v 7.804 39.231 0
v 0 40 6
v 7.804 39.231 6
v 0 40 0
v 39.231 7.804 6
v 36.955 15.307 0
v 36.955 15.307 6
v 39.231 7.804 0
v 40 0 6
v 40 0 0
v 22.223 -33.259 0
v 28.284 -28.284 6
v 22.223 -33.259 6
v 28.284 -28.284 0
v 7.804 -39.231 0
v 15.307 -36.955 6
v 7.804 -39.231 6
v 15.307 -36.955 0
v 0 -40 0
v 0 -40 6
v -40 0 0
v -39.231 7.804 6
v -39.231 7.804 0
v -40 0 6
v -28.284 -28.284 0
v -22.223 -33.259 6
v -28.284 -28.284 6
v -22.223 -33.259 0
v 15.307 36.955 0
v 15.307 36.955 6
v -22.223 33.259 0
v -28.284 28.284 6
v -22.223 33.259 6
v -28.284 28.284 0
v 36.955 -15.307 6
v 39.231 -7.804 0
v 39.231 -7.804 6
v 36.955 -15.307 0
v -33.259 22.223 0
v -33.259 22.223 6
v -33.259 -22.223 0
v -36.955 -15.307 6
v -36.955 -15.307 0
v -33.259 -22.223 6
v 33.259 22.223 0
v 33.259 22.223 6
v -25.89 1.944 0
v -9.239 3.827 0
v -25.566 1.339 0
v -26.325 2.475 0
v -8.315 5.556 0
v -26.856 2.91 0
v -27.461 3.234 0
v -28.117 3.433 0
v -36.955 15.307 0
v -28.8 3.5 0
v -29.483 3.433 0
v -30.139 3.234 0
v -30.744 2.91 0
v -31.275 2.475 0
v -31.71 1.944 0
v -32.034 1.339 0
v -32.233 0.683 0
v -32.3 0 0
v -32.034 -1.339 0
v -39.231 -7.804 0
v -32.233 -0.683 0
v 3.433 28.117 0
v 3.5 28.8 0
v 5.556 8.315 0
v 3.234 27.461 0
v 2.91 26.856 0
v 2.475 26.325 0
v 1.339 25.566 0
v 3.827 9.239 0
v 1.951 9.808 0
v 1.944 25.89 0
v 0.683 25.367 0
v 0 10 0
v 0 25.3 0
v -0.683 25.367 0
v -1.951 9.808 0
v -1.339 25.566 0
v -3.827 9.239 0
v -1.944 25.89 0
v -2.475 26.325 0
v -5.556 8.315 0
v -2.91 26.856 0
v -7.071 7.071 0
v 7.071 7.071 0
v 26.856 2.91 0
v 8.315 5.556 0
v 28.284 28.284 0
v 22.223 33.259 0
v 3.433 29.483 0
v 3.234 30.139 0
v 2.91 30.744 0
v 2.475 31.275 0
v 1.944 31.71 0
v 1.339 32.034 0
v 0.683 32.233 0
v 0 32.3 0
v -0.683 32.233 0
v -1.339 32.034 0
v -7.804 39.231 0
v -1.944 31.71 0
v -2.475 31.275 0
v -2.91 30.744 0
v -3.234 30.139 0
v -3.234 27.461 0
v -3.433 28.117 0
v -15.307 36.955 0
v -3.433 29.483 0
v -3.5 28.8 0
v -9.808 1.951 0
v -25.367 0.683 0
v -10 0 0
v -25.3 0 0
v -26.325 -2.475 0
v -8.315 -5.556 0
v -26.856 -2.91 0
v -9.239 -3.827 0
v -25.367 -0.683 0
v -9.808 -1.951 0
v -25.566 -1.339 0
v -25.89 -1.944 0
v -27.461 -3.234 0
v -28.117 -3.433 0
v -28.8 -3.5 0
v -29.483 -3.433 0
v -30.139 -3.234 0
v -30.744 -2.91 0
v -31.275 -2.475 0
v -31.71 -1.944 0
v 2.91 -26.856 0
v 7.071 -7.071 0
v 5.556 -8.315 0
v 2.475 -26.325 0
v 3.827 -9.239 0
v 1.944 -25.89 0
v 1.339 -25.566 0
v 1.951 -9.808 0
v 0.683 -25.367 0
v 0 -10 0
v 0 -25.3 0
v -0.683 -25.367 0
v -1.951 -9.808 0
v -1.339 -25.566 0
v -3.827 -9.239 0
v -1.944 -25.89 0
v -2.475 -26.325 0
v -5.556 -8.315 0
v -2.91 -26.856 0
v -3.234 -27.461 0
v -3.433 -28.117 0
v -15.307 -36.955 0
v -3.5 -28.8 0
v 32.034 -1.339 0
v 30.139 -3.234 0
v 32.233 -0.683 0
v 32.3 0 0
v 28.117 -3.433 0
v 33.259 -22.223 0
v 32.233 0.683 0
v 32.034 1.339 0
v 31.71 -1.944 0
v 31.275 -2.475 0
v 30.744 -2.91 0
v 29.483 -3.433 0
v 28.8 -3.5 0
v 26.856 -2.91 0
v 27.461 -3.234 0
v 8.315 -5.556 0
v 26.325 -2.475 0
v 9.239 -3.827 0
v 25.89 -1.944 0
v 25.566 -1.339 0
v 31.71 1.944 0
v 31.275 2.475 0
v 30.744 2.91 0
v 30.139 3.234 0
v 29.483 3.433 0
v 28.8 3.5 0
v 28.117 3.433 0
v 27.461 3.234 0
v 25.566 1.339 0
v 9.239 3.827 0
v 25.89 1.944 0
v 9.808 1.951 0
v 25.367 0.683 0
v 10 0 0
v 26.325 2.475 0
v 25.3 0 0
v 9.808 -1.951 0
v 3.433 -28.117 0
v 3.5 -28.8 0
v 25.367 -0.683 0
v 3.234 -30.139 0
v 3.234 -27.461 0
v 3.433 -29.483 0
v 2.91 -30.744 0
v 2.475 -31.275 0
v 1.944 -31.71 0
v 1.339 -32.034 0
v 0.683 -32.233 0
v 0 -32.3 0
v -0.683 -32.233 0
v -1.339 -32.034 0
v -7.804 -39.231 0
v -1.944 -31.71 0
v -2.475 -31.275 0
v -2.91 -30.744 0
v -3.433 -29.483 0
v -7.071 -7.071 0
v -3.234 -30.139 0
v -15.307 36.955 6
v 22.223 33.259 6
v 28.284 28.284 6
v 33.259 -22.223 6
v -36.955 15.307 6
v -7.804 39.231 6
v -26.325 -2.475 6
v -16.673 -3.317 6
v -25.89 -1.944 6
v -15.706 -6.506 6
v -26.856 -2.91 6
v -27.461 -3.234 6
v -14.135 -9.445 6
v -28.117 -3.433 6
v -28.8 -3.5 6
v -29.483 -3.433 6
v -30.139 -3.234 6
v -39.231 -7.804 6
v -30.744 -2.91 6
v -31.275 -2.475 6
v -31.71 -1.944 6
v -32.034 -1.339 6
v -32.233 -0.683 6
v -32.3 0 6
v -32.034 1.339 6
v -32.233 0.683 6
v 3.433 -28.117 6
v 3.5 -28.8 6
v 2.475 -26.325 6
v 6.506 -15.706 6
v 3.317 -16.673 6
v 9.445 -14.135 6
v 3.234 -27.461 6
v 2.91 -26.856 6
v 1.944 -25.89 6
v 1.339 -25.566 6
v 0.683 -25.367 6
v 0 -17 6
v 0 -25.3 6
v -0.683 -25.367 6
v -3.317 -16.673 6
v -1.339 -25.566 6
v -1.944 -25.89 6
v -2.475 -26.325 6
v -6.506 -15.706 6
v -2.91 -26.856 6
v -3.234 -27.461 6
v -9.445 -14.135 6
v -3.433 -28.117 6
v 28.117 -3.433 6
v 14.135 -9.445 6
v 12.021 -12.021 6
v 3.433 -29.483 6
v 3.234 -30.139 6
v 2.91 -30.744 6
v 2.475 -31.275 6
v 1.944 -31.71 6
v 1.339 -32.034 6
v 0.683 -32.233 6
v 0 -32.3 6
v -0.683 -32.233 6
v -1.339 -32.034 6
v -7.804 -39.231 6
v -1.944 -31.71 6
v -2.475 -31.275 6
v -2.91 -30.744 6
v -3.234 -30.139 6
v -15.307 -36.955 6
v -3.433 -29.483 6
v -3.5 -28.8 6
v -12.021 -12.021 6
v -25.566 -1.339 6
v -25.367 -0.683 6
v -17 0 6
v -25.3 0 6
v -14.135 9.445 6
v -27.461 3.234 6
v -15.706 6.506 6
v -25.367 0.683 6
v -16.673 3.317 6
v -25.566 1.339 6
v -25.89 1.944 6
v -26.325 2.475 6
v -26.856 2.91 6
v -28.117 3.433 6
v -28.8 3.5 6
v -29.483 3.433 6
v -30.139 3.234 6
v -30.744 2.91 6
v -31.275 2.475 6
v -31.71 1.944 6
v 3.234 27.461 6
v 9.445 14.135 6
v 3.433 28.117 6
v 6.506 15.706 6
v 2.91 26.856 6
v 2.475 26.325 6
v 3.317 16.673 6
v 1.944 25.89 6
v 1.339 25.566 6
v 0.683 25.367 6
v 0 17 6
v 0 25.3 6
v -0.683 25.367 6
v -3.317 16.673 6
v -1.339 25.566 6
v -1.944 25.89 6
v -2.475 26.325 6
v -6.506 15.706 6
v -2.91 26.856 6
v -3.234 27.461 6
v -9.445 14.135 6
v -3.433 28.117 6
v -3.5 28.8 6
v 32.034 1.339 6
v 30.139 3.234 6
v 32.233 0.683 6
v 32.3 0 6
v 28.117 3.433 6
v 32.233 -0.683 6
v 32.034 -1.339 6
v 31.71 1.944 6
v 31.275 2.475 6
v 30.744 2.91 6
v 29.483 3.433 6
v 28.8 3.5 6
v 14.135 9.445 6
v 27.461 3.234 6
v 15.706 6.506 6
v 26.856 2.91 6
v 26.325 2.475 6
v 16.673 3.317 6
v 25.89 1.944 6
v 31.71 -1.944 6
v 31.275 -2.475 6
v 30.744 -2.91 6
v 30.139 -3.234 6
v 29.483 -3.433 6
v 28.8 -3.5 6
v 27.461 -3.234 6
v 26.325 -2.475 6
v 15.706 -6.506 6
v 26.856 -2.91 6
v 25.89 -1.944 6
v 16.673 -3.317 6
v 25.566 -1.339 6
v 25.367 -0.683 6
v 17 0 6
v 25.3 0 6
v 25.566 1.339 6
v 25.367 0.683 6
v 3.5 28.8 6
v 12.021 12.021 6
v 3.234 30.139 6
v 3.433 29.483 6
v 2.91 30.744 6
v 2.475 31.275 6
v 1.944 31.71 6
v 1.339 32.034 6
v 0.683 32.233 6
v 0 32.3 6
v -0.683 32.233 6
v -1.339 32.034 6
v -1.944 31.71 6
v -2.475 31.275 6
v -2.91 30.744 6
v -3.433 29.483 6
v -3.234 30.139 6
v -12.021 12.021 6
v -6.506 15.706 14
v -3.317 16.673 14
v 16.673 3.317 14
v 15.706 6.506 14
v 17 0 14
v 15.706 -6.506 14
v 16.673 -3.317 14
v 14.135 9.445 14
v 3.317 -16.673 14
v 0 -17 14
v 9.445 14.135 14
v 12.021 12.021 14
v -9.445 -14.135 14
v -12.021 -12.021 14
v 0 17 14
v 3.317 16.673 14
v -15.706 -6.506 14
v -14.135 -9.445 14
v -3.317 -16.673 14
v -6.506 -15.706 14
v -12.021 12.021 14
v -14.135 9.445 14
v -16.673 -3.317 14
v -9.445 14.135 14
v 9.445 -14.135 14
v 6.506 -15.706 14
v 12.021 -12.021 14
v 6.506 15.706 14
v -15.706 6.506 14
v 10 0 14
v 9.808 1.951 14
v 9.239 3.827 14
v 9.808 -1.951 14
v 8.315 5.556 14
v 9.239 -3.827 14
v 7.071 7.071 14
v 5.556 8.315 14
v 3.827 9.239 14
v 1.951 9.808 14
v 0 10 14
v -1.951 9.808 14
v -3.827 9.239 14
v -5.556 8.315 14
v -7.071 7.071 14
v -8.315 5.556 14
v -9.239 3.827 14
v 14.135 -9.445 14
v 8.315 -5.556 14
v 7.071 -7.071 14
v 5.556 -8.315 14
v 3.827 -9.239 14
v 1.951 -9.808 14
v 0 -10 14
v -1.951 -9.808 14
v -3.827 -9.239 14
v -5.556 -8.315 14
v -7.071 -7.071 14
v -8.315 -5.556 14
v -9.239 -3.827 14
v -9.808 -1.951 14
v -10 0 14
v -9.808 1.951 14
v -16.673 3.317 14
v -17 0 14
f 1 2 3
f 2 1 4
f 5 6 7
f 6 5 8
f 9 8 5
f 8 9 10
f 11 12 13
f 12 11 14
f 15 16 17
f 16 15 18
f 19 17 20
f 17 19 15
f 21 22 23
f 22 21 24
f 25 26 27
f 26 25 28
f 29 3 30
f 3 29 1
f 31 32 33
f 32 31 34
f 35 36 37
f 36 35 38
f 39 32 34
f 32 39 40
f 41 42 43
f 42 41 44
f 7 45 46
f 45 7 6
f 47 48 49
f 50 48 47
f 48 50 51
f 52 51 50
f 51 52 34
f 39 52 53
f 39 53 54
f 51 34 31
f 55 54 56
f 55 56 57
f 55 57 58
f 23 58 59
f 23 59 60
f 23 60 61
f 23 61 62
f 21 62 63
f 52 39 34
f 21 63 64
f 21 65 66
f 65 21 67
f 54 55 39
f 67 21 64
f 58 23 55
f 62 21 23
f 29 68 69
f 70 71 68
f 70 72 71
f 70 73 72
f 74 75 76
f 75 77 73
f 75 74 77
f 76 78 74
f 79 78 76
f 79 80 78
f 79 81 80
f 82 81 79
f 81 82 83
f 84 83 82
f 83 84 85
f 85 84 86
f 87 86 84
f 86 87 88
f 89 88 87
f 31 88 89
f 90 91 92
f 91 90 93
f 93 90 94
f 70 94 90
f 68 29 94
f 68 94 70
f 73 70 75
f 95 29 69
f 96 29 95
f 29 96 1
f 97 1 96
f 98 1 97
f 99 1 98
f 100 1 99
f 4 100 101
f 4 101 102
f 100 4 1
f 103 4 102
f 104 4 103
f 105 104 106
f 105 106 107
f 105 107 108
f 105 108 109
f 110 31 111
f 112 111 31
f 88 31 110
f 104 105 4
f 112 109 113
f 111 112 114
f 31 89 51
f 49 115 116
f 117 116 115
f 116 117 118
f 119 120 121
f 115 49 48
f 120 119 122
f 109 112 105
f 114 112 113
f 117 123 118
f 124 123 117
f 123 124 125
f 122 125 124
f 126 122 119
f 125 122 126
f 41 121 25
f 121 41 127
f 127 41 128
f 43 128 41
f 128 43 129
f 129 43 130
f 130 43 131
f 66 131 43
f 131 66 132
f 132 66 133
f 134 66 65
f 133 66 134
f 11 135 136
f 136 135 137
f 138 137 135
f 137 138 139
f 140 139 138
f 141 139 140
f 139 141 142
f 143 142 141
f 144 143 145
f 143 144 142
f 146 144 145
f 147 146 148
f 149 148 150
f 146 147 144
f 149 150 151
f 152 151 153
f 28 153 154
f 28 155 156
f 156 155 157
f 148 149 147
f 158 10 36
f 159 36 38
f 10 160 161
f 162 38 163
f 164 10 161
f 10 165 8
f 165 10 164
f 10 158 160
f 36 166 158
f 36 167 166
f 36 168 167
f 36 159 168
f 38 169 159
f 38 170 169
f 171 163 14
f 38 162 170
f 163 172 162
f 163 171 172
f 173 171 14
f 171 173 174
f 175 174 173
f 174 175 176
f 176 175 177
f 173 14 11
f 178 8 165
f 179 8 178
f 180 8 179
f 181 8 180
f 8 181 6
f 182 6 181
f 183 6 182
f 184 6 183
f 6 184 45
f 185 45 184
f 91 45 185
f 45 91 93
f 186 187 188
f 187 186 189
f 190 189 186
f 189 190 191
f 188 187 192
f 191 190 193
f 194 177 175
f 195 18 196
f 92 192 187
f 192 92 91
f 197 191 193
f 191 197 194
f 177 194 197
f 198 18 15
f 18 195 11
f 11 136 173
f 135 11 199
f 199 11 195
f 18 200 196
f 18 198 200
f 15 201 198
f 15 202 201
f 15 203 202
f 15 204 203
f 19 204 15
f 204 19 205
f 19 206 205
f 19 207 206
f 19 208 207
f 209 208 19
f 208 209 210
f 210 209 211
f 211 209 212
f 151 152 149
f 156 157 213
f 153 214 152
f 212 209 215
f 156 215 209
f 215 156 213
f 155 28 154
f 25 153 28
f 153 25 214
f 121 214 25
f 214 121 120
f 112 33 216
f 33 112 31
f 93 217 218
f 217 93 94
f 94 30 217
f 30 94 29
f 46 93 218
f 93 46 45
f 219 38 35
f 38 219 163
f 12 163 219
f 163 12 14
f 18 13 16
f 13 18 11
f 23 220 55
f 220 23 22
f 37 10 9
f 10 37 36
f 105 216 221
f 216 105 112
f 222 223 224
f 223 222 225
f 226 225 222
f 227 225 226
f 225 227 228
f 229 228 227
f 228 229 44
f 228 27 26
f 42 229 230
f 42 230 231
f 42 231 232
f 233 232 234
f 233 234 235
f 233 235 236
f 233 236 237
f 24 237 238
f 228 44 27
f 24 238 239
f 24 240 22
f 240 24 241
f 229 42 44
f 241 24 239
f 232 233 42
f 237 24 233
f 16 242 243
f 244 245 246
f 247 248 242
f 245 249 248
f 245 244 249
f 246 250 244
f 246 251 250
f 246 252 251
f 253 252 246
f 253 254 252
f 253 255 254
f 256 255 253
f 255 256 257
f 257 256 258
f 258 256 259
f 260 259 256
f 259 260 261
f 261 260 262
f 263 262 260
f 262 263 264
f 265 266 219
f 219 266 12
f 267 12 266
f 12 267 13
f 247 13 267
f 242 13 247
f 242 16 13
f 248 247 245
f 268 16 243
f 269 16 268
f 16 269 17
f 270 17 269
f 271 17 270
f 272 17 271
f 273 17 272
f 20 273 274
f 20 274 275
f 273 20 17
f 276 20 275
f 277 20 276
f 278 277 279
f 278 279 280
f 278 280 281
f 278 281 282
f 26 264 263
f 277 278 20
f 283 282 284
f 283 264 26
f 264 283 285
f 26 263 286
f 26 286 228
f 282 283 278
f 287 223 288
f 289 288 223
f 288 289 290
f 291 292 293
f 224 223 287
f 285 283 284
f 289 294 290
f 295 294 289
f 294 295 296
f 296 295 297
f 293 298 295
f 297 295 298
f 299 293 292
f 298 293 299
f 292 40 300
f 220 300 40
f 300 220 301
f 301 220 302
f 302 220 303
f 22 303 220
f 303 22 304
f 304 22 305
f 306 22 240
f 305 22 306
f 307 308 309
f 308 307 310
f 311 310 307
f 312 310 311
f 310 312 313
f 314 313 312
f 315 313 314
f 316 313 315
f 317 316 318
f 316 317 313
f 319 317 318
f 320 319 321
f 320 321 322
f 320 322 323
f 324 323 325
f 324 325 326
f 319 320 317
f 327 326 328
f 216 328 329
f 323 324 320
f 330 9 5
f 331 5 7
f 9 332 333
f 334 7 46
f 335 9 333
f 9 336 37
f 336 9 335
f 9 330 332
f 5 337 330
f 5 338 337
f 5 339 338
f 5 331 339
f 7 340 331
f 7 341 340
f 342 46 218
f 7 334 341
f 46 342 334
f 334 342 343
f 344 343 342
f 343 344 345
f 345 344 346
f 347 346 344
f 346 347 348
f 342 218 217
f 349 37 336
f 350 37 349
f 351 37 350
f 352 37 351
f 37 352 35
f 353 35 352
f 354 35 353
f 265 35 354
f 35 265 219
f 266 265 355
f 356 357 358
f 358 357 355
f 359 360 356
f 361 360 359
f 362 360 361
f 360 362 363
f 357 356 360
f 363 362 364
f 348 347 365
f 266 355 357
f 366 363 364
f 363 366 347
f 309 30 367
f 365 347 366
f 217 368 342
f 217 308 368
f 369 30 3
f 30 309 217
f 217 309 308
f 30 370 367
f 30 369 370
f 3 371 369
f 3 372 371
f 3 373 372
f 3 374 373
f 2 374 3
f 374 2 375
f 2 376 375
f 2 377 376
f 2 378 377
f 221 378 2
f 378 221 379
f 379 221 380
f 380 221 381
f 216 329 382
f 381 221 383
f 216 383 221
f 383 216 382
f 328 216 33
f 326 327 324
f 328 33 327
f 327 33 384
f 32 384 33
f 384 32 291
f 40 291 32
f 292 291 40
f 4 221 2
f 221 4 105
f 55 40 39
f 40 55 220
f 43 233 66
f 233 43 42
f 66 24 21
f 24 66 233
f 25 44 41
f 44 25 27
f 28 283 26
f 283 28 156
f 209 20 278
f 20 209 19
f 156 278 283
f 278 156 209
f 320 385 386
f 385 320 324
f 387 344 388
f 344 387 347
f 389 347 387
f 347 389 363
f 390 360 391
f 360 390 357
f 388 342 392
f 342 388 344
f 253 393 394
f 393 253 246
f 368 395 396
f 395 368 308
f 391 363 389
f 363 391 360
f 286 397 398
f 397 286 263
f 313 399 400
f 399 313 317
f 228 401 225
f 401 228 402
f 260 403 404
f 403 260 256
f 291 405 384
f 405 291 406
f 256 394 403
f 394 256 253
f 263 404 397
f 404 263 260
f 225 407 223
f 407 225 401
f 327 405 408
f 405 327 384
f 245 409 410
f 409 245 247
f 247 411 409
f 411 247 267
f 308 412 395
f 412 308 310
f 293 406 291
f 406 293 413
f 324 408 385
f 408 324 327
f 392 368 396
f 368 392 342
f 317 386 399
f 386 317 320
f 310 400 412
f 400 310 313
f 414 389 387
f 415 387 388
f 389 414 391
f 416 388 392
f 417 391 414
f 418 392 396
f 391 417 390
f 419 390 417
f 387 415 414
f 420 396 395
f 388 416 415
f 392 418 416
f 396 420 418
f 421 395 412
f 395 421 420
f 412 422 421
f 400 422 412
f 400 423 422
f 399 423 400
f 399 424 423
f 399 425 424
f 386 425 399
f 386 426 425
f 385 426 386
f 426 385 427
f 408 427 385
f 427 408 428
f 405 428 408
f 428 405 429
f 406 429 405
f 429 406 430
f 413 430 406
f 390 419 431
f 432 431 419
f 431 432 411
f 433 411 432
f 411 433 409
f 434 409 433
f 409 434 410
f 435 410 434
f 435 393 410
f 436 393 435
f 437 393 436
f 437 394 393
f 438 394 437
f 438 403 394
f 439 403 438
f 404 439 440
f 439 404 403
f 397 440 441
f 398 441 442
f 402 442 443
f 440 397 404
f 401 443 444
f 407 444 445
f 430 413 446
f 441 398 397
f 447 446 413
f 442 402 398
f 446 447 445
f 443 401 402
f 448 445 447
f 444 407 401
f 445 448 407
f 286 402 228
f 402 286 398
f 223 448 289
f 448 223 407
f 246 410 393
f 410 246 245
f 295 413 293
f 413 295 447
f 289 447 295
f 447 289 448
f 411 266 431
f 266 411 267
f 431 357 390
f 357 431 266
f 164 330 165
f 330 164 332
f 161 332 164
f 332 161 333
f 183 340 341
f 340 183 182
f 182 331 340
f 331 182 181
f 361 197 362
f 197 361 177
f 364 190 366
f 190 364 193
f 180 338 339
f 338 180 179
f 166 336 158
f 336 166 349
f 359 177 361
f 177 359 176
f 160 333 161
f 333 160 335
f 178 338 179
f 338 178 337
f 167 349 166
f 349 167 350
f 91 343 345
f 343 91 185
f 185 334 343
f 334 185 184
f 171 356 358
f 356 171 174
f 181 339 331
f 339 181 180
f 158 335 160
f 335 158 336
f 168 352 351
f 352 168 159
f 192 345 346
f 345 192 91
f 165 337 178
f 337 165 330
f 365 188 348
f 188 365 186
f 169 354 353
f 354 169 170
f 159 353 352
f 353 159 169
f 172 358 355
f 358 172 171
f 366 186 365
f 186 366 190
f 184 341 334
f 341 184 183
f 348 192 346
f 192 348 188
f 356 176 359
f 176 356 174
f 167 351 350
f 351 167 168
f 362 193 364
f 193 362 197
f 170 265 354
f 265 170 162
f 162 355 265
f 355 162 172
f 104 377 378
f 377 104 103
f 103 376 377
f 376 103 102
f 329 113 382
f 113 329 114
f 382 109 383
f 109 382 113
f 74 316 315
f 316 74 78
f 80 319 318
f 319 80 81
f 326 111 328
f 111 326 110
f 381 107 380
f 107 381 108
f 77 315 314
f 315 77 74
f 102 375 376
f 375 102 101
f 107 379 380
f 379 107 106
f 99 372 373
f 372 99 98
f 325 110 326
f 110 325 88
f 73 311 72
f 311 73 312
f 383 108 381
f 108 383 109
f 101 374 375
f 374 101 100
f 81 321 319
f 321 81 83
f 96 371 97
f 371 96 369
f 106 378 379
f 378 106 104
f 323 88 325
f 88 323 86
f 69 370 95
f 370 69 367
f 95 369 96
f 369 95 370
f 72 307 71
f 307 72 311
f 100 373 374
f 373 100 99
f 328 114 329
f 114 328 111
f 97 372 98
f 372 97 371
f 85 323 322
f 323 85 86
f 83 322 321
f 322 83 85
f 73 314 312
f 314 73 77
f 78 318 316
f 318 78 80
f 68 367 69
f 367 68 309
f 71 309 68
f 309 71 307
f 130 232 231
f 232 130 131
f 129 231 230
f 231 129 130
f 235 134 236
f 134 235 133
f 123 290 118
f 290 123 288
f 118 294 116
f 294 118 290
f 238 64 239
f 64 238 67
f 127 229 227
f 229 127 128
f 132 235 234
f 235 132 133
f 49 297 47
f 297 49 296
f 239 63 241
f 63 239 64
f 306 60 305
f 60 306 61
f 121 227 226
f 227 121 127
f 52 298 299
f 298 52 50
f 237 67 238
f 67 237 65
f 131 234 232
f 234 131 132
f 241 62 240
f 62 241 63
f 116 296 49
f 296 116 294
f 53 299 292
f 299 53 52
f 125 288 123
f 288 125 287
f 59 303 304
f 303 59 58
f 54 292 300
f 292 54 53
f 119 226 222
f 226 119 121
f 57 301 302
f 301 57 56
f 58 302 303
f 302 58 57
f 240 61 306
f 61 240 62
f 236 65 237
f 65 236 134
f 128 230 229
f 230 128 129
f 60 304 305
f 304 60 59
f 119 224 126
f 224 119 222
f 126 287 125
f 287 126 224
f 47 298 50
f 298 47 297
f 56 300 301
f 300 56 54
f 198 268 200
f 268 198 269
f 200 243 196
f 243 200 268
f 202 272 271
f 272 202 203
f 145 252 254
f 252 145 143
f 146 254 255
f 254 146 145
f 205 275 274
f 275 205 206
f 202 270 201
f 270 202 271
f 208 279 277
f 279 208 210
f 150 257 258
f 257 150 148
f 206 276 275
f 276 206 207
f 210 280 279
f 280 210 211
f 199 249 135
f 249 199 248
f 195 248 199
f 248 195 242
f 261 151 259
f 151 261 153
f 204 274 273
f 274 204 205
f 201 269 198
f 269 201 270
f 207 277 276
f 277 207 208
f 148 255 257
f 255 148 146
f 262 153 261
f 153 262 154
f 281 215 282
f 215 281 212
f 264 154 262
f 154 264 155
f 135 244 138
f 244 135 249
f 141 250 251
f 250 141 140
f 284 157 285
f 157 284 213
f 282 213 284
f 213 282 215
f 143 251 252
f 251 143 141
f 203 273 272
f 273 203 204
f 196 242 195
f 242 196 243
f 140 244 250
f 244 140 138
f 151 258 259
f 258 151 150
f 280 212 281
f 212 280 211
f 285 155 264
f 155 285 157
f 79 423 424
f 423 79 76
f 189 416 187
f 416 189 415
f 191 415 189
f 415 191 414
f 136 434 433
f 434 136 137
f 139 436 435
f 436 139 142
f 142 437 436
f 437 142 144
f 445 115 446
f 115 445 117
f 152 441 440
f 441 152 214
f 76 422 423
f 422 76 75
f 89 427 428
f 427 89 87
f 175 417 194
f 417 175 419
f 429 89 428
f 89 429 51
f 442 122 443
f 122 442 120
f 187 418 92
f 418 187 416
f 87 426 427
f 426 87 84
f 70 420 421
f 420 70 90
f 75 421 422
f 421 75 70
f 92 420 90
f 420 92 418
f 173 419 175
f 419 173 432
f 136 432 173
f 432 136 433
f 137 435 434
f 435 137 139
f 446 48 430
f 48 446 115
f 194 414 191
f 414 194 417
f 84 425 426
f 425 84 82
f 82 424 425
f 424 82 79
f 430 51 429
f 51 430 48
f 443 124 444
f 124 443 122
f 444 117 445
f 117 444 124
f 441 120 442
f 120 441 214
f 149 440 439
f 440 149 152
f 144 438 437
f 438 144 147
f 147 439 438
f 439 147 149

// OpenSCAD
$fn = 32;

// ----------------------------------------------------------------------
// Bolt-circle flange: 80 mm outside, 4 bolt holes, bore 20 mm
// ----------------------------------------------------------------------

// --- parameters (mm) ---
flange_d = 80;            // flange outside diameter
flange_t = 6;             // flange thickness
bolts = 4;                // number of bolt holes
bolt_d = 7;               // bolt clearance
bolt_r = 28.8;            // bolt circle radius
bore_d = 20;              // centre bore
hub_d = 34;               // raised hub diameter
hub_h = 8;                // raised hub height

module body() {
  cylinder(h = flange_t, d = flange_d);
  /* raised hub, sunk 1 mm into the flange */
  translate([0, 0, flange_t - 1]) cylinder(h = hub_h + 1, d = hub_d);
}

difference() {
  body();
  /* bolt circle */
  for (i = [0 : bolts - 1]) rotate([0, 0, i * 360 / bolts]) translate([bolt_r, 0, -1]) cylinder(h = flange_t + hub_h + 3, d = bolt_d);
  translate([0, 0, -1]) cylinder(h = flange_t + hub_h + 3, d = bore_d);
}
